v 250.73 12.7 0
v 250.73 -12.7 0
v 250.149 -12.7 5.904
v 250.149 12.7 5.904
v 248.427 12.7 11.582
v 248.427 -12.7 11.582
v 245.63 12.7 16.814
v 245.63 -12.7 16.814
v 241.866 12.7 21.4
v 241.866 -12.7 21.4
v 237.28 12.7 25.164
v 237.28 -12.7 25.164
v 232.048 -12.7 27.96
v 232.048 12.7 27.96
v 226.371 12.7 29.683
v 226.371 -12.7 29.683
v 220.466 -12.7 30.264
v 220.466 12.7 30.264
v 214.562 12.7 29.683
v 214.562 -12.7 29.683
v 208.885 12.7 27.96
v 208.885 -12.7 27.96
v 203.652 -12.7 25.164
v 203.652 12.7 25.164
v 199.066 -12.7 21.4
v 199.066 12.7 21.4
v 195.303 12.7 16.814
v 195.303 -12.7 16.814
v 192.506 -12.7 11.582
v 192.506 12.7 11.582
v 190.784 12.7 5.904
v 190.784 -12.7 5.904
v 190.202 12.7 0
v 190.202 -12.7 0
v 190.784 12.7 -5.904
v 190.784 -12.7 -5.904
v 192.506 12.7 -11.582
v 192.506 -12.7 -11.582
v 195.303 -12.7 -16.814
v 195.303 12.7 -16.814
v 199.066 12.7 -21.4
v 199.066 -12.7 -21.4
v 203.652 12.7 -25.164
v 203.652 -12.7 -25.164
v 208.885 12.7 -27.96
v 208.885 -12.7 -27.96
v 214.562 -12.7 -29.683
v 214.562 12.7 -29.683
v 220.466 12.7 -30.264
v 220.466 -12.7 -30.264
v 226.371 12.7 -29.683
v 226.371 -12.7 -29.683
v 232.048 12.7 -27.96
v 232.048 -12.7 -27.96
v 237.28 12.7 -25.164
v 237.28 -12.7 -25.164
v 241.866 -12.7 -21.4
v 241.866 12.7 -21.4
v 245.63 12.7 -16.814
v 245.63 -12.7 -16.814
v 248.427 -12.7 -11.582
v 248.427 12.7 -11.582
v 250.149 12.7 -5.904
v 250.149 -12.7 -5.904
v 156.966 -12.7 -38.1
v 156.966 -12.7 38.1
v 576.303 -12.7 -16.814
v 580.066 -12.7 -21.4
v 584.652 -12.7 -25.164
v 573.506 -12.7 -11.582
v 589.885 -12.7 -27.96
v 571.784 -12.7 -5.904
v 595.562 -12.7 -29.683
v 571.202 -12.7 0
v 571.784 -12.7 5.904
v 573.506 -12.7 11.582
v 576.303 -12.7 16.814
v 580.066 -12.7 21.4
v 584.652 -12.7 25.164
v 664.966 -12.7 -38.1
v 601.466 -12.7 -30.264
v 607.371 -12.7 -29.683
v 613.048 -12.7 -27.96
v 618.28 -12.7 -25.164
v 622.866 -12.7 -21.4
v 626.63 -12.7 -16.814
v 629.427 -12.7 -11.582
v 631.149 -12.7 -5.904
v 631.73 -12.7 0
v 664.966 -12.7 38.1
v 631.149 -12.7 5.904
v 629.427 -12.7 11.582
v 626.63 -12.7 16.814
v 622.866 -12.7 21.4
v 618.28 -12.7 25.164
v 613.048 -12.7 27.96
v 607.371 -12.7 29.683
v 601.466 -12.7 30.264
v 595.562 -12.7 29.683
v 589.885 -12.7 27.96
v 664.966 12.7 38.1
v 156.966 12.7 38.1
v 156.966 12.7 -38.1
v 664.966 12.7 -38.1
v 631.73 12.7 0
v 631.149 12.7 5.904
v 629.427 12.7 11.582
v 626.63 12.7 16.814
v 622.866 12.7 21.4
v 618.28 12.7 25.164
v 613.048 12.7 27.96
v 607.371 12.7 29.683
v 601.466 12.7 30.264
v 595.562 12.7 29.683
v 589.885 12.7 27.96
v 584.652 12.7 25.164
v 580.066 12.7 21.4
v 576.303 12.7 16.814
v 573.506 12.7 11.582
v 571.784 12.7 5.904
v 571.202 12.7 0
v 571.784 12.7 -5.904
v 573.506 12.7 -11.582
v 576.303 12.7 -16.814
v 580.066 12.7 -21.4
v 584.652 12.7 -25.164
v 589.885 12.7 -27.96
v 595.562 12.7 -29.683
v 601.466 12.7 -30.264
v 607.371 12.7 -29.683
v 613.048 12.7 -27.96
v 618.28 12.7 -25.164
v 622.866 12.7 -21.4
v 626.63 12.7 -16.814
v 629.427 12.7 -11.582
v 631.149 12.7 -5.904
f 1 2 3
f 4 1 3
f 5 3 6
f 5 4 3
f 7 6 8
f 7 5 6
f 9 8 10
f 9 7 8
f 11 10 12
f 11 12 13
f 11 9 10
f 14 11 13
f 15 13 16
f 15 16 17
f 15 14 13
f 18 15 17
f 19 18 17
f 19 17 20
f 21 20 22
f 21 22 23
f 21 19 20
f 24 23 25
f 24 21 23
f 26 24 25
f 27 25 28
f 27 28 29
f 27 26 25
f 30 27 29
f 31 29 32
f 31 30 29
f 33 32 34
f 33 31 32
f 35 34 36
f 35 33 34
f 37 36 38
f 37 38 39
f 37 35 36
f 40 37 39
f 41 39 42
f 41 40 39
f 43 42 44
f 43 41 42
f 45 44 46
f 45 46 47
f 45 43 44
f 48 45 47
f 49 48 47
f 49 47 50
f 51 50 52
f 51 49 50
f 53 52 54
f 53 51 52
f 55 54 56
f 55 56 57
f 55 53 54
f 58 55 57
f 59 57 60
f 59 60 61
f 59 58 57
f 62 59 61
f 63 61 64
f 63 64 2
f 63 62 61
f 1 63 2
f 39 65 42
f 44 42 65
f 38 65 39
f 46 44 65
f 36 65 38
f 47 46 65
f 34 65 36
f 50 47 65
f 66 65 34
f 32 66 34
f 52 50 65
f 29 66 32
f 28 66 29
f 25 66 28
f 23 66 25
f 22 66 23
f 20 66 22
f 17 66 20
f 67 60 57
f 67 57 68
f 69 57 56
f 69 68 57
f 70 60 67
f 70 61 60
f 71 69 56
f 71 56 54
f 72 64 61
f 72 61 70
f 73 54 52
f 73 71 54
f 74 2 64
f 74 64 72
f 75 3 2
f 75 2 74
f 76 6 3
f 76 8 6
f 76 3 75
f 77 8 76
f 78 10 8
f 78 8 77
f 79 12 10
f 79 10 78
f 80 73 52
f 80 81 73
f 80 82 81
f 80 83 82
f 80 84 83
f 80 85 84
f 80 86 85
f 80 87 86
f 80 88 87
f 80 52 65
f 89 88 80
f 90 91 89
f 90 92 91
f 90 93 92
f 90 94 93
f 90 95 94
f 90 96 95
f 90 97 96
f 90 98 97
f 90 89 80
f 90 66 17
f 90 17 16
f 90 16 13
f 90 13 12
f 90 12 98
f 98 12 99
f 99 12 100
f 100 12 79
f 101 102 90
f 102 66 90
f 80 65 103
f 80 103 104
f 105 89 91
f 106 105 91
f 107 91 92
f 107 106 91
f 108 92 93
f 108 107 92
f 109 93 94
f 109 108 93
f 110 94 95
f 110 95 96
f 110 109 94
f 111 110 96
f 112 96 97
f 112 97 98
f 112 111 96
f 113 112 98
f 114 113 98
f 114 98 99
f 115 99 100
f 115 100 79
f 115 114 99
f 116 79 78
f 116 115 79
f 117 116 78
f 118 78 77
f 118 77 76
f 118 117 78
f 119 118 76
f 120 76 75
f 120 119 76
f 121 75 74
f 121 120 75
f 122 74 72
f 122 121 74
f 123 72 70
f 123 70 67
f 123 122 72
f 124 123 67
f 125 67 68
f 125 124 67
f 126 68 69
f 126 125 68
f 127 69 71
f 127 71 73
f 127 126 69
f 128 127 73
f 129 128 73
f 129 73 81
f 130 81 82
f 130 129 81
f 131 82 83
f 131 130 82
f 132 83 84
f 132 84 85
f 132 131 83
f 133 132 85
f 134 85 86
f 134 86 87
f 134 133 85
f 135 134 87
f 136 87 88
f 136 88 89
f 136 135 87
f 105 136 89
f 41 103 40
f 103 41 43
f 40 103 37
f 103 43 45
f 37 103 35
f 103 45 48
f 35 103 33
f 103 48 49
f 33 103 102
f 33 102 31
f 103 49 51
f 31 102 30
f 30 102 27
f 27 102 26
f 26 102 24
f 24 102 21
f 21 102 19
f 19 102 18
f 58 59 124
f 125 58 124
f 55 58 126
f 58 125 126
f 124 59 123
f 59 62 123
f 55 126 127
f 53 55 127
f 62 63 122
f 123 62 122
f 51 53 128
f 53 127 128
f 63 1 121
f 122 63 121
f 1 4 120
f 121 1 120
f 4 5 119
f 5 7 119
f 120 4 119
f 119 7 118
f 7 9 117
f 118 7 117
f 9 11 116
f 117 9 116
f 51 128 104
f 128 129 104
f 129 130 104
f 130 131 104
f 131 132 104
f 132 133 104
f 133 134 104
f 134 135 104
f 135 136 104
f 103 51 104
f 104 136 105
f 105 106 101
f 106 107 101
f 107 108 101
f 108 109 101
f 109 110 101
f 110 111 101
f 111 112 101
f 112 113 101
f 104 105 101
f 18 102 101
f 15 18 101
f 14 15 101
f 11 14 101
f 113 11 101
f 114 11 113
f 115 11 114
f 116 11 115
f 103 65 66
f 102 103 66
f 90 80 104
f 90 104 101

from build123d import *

# Parameters (mm, degrees)
F0_W     = 508
F0_H     = 76.2
F0_R     = 30.2641
F1_DEPTH = 12.7


with BuildPart() as f1:
    # F0 (on Front) → F1 (new body, symmetric)
    with BuildSketch(Plane.XZ):
        with Locations((410.966302, 0)):
            Rectangle(F0_W, F0_H)
        with Locations((220.466302, 0)):
            Circle(F0_R, mode=Mode.SUBTRACT)
        with Locations((601.466302, 0)):
            Circle(F0_R, mode=Mode.SUBTRACT)
    extrude(amount=F1_DEPTH, both=True)


solid = f1.part
